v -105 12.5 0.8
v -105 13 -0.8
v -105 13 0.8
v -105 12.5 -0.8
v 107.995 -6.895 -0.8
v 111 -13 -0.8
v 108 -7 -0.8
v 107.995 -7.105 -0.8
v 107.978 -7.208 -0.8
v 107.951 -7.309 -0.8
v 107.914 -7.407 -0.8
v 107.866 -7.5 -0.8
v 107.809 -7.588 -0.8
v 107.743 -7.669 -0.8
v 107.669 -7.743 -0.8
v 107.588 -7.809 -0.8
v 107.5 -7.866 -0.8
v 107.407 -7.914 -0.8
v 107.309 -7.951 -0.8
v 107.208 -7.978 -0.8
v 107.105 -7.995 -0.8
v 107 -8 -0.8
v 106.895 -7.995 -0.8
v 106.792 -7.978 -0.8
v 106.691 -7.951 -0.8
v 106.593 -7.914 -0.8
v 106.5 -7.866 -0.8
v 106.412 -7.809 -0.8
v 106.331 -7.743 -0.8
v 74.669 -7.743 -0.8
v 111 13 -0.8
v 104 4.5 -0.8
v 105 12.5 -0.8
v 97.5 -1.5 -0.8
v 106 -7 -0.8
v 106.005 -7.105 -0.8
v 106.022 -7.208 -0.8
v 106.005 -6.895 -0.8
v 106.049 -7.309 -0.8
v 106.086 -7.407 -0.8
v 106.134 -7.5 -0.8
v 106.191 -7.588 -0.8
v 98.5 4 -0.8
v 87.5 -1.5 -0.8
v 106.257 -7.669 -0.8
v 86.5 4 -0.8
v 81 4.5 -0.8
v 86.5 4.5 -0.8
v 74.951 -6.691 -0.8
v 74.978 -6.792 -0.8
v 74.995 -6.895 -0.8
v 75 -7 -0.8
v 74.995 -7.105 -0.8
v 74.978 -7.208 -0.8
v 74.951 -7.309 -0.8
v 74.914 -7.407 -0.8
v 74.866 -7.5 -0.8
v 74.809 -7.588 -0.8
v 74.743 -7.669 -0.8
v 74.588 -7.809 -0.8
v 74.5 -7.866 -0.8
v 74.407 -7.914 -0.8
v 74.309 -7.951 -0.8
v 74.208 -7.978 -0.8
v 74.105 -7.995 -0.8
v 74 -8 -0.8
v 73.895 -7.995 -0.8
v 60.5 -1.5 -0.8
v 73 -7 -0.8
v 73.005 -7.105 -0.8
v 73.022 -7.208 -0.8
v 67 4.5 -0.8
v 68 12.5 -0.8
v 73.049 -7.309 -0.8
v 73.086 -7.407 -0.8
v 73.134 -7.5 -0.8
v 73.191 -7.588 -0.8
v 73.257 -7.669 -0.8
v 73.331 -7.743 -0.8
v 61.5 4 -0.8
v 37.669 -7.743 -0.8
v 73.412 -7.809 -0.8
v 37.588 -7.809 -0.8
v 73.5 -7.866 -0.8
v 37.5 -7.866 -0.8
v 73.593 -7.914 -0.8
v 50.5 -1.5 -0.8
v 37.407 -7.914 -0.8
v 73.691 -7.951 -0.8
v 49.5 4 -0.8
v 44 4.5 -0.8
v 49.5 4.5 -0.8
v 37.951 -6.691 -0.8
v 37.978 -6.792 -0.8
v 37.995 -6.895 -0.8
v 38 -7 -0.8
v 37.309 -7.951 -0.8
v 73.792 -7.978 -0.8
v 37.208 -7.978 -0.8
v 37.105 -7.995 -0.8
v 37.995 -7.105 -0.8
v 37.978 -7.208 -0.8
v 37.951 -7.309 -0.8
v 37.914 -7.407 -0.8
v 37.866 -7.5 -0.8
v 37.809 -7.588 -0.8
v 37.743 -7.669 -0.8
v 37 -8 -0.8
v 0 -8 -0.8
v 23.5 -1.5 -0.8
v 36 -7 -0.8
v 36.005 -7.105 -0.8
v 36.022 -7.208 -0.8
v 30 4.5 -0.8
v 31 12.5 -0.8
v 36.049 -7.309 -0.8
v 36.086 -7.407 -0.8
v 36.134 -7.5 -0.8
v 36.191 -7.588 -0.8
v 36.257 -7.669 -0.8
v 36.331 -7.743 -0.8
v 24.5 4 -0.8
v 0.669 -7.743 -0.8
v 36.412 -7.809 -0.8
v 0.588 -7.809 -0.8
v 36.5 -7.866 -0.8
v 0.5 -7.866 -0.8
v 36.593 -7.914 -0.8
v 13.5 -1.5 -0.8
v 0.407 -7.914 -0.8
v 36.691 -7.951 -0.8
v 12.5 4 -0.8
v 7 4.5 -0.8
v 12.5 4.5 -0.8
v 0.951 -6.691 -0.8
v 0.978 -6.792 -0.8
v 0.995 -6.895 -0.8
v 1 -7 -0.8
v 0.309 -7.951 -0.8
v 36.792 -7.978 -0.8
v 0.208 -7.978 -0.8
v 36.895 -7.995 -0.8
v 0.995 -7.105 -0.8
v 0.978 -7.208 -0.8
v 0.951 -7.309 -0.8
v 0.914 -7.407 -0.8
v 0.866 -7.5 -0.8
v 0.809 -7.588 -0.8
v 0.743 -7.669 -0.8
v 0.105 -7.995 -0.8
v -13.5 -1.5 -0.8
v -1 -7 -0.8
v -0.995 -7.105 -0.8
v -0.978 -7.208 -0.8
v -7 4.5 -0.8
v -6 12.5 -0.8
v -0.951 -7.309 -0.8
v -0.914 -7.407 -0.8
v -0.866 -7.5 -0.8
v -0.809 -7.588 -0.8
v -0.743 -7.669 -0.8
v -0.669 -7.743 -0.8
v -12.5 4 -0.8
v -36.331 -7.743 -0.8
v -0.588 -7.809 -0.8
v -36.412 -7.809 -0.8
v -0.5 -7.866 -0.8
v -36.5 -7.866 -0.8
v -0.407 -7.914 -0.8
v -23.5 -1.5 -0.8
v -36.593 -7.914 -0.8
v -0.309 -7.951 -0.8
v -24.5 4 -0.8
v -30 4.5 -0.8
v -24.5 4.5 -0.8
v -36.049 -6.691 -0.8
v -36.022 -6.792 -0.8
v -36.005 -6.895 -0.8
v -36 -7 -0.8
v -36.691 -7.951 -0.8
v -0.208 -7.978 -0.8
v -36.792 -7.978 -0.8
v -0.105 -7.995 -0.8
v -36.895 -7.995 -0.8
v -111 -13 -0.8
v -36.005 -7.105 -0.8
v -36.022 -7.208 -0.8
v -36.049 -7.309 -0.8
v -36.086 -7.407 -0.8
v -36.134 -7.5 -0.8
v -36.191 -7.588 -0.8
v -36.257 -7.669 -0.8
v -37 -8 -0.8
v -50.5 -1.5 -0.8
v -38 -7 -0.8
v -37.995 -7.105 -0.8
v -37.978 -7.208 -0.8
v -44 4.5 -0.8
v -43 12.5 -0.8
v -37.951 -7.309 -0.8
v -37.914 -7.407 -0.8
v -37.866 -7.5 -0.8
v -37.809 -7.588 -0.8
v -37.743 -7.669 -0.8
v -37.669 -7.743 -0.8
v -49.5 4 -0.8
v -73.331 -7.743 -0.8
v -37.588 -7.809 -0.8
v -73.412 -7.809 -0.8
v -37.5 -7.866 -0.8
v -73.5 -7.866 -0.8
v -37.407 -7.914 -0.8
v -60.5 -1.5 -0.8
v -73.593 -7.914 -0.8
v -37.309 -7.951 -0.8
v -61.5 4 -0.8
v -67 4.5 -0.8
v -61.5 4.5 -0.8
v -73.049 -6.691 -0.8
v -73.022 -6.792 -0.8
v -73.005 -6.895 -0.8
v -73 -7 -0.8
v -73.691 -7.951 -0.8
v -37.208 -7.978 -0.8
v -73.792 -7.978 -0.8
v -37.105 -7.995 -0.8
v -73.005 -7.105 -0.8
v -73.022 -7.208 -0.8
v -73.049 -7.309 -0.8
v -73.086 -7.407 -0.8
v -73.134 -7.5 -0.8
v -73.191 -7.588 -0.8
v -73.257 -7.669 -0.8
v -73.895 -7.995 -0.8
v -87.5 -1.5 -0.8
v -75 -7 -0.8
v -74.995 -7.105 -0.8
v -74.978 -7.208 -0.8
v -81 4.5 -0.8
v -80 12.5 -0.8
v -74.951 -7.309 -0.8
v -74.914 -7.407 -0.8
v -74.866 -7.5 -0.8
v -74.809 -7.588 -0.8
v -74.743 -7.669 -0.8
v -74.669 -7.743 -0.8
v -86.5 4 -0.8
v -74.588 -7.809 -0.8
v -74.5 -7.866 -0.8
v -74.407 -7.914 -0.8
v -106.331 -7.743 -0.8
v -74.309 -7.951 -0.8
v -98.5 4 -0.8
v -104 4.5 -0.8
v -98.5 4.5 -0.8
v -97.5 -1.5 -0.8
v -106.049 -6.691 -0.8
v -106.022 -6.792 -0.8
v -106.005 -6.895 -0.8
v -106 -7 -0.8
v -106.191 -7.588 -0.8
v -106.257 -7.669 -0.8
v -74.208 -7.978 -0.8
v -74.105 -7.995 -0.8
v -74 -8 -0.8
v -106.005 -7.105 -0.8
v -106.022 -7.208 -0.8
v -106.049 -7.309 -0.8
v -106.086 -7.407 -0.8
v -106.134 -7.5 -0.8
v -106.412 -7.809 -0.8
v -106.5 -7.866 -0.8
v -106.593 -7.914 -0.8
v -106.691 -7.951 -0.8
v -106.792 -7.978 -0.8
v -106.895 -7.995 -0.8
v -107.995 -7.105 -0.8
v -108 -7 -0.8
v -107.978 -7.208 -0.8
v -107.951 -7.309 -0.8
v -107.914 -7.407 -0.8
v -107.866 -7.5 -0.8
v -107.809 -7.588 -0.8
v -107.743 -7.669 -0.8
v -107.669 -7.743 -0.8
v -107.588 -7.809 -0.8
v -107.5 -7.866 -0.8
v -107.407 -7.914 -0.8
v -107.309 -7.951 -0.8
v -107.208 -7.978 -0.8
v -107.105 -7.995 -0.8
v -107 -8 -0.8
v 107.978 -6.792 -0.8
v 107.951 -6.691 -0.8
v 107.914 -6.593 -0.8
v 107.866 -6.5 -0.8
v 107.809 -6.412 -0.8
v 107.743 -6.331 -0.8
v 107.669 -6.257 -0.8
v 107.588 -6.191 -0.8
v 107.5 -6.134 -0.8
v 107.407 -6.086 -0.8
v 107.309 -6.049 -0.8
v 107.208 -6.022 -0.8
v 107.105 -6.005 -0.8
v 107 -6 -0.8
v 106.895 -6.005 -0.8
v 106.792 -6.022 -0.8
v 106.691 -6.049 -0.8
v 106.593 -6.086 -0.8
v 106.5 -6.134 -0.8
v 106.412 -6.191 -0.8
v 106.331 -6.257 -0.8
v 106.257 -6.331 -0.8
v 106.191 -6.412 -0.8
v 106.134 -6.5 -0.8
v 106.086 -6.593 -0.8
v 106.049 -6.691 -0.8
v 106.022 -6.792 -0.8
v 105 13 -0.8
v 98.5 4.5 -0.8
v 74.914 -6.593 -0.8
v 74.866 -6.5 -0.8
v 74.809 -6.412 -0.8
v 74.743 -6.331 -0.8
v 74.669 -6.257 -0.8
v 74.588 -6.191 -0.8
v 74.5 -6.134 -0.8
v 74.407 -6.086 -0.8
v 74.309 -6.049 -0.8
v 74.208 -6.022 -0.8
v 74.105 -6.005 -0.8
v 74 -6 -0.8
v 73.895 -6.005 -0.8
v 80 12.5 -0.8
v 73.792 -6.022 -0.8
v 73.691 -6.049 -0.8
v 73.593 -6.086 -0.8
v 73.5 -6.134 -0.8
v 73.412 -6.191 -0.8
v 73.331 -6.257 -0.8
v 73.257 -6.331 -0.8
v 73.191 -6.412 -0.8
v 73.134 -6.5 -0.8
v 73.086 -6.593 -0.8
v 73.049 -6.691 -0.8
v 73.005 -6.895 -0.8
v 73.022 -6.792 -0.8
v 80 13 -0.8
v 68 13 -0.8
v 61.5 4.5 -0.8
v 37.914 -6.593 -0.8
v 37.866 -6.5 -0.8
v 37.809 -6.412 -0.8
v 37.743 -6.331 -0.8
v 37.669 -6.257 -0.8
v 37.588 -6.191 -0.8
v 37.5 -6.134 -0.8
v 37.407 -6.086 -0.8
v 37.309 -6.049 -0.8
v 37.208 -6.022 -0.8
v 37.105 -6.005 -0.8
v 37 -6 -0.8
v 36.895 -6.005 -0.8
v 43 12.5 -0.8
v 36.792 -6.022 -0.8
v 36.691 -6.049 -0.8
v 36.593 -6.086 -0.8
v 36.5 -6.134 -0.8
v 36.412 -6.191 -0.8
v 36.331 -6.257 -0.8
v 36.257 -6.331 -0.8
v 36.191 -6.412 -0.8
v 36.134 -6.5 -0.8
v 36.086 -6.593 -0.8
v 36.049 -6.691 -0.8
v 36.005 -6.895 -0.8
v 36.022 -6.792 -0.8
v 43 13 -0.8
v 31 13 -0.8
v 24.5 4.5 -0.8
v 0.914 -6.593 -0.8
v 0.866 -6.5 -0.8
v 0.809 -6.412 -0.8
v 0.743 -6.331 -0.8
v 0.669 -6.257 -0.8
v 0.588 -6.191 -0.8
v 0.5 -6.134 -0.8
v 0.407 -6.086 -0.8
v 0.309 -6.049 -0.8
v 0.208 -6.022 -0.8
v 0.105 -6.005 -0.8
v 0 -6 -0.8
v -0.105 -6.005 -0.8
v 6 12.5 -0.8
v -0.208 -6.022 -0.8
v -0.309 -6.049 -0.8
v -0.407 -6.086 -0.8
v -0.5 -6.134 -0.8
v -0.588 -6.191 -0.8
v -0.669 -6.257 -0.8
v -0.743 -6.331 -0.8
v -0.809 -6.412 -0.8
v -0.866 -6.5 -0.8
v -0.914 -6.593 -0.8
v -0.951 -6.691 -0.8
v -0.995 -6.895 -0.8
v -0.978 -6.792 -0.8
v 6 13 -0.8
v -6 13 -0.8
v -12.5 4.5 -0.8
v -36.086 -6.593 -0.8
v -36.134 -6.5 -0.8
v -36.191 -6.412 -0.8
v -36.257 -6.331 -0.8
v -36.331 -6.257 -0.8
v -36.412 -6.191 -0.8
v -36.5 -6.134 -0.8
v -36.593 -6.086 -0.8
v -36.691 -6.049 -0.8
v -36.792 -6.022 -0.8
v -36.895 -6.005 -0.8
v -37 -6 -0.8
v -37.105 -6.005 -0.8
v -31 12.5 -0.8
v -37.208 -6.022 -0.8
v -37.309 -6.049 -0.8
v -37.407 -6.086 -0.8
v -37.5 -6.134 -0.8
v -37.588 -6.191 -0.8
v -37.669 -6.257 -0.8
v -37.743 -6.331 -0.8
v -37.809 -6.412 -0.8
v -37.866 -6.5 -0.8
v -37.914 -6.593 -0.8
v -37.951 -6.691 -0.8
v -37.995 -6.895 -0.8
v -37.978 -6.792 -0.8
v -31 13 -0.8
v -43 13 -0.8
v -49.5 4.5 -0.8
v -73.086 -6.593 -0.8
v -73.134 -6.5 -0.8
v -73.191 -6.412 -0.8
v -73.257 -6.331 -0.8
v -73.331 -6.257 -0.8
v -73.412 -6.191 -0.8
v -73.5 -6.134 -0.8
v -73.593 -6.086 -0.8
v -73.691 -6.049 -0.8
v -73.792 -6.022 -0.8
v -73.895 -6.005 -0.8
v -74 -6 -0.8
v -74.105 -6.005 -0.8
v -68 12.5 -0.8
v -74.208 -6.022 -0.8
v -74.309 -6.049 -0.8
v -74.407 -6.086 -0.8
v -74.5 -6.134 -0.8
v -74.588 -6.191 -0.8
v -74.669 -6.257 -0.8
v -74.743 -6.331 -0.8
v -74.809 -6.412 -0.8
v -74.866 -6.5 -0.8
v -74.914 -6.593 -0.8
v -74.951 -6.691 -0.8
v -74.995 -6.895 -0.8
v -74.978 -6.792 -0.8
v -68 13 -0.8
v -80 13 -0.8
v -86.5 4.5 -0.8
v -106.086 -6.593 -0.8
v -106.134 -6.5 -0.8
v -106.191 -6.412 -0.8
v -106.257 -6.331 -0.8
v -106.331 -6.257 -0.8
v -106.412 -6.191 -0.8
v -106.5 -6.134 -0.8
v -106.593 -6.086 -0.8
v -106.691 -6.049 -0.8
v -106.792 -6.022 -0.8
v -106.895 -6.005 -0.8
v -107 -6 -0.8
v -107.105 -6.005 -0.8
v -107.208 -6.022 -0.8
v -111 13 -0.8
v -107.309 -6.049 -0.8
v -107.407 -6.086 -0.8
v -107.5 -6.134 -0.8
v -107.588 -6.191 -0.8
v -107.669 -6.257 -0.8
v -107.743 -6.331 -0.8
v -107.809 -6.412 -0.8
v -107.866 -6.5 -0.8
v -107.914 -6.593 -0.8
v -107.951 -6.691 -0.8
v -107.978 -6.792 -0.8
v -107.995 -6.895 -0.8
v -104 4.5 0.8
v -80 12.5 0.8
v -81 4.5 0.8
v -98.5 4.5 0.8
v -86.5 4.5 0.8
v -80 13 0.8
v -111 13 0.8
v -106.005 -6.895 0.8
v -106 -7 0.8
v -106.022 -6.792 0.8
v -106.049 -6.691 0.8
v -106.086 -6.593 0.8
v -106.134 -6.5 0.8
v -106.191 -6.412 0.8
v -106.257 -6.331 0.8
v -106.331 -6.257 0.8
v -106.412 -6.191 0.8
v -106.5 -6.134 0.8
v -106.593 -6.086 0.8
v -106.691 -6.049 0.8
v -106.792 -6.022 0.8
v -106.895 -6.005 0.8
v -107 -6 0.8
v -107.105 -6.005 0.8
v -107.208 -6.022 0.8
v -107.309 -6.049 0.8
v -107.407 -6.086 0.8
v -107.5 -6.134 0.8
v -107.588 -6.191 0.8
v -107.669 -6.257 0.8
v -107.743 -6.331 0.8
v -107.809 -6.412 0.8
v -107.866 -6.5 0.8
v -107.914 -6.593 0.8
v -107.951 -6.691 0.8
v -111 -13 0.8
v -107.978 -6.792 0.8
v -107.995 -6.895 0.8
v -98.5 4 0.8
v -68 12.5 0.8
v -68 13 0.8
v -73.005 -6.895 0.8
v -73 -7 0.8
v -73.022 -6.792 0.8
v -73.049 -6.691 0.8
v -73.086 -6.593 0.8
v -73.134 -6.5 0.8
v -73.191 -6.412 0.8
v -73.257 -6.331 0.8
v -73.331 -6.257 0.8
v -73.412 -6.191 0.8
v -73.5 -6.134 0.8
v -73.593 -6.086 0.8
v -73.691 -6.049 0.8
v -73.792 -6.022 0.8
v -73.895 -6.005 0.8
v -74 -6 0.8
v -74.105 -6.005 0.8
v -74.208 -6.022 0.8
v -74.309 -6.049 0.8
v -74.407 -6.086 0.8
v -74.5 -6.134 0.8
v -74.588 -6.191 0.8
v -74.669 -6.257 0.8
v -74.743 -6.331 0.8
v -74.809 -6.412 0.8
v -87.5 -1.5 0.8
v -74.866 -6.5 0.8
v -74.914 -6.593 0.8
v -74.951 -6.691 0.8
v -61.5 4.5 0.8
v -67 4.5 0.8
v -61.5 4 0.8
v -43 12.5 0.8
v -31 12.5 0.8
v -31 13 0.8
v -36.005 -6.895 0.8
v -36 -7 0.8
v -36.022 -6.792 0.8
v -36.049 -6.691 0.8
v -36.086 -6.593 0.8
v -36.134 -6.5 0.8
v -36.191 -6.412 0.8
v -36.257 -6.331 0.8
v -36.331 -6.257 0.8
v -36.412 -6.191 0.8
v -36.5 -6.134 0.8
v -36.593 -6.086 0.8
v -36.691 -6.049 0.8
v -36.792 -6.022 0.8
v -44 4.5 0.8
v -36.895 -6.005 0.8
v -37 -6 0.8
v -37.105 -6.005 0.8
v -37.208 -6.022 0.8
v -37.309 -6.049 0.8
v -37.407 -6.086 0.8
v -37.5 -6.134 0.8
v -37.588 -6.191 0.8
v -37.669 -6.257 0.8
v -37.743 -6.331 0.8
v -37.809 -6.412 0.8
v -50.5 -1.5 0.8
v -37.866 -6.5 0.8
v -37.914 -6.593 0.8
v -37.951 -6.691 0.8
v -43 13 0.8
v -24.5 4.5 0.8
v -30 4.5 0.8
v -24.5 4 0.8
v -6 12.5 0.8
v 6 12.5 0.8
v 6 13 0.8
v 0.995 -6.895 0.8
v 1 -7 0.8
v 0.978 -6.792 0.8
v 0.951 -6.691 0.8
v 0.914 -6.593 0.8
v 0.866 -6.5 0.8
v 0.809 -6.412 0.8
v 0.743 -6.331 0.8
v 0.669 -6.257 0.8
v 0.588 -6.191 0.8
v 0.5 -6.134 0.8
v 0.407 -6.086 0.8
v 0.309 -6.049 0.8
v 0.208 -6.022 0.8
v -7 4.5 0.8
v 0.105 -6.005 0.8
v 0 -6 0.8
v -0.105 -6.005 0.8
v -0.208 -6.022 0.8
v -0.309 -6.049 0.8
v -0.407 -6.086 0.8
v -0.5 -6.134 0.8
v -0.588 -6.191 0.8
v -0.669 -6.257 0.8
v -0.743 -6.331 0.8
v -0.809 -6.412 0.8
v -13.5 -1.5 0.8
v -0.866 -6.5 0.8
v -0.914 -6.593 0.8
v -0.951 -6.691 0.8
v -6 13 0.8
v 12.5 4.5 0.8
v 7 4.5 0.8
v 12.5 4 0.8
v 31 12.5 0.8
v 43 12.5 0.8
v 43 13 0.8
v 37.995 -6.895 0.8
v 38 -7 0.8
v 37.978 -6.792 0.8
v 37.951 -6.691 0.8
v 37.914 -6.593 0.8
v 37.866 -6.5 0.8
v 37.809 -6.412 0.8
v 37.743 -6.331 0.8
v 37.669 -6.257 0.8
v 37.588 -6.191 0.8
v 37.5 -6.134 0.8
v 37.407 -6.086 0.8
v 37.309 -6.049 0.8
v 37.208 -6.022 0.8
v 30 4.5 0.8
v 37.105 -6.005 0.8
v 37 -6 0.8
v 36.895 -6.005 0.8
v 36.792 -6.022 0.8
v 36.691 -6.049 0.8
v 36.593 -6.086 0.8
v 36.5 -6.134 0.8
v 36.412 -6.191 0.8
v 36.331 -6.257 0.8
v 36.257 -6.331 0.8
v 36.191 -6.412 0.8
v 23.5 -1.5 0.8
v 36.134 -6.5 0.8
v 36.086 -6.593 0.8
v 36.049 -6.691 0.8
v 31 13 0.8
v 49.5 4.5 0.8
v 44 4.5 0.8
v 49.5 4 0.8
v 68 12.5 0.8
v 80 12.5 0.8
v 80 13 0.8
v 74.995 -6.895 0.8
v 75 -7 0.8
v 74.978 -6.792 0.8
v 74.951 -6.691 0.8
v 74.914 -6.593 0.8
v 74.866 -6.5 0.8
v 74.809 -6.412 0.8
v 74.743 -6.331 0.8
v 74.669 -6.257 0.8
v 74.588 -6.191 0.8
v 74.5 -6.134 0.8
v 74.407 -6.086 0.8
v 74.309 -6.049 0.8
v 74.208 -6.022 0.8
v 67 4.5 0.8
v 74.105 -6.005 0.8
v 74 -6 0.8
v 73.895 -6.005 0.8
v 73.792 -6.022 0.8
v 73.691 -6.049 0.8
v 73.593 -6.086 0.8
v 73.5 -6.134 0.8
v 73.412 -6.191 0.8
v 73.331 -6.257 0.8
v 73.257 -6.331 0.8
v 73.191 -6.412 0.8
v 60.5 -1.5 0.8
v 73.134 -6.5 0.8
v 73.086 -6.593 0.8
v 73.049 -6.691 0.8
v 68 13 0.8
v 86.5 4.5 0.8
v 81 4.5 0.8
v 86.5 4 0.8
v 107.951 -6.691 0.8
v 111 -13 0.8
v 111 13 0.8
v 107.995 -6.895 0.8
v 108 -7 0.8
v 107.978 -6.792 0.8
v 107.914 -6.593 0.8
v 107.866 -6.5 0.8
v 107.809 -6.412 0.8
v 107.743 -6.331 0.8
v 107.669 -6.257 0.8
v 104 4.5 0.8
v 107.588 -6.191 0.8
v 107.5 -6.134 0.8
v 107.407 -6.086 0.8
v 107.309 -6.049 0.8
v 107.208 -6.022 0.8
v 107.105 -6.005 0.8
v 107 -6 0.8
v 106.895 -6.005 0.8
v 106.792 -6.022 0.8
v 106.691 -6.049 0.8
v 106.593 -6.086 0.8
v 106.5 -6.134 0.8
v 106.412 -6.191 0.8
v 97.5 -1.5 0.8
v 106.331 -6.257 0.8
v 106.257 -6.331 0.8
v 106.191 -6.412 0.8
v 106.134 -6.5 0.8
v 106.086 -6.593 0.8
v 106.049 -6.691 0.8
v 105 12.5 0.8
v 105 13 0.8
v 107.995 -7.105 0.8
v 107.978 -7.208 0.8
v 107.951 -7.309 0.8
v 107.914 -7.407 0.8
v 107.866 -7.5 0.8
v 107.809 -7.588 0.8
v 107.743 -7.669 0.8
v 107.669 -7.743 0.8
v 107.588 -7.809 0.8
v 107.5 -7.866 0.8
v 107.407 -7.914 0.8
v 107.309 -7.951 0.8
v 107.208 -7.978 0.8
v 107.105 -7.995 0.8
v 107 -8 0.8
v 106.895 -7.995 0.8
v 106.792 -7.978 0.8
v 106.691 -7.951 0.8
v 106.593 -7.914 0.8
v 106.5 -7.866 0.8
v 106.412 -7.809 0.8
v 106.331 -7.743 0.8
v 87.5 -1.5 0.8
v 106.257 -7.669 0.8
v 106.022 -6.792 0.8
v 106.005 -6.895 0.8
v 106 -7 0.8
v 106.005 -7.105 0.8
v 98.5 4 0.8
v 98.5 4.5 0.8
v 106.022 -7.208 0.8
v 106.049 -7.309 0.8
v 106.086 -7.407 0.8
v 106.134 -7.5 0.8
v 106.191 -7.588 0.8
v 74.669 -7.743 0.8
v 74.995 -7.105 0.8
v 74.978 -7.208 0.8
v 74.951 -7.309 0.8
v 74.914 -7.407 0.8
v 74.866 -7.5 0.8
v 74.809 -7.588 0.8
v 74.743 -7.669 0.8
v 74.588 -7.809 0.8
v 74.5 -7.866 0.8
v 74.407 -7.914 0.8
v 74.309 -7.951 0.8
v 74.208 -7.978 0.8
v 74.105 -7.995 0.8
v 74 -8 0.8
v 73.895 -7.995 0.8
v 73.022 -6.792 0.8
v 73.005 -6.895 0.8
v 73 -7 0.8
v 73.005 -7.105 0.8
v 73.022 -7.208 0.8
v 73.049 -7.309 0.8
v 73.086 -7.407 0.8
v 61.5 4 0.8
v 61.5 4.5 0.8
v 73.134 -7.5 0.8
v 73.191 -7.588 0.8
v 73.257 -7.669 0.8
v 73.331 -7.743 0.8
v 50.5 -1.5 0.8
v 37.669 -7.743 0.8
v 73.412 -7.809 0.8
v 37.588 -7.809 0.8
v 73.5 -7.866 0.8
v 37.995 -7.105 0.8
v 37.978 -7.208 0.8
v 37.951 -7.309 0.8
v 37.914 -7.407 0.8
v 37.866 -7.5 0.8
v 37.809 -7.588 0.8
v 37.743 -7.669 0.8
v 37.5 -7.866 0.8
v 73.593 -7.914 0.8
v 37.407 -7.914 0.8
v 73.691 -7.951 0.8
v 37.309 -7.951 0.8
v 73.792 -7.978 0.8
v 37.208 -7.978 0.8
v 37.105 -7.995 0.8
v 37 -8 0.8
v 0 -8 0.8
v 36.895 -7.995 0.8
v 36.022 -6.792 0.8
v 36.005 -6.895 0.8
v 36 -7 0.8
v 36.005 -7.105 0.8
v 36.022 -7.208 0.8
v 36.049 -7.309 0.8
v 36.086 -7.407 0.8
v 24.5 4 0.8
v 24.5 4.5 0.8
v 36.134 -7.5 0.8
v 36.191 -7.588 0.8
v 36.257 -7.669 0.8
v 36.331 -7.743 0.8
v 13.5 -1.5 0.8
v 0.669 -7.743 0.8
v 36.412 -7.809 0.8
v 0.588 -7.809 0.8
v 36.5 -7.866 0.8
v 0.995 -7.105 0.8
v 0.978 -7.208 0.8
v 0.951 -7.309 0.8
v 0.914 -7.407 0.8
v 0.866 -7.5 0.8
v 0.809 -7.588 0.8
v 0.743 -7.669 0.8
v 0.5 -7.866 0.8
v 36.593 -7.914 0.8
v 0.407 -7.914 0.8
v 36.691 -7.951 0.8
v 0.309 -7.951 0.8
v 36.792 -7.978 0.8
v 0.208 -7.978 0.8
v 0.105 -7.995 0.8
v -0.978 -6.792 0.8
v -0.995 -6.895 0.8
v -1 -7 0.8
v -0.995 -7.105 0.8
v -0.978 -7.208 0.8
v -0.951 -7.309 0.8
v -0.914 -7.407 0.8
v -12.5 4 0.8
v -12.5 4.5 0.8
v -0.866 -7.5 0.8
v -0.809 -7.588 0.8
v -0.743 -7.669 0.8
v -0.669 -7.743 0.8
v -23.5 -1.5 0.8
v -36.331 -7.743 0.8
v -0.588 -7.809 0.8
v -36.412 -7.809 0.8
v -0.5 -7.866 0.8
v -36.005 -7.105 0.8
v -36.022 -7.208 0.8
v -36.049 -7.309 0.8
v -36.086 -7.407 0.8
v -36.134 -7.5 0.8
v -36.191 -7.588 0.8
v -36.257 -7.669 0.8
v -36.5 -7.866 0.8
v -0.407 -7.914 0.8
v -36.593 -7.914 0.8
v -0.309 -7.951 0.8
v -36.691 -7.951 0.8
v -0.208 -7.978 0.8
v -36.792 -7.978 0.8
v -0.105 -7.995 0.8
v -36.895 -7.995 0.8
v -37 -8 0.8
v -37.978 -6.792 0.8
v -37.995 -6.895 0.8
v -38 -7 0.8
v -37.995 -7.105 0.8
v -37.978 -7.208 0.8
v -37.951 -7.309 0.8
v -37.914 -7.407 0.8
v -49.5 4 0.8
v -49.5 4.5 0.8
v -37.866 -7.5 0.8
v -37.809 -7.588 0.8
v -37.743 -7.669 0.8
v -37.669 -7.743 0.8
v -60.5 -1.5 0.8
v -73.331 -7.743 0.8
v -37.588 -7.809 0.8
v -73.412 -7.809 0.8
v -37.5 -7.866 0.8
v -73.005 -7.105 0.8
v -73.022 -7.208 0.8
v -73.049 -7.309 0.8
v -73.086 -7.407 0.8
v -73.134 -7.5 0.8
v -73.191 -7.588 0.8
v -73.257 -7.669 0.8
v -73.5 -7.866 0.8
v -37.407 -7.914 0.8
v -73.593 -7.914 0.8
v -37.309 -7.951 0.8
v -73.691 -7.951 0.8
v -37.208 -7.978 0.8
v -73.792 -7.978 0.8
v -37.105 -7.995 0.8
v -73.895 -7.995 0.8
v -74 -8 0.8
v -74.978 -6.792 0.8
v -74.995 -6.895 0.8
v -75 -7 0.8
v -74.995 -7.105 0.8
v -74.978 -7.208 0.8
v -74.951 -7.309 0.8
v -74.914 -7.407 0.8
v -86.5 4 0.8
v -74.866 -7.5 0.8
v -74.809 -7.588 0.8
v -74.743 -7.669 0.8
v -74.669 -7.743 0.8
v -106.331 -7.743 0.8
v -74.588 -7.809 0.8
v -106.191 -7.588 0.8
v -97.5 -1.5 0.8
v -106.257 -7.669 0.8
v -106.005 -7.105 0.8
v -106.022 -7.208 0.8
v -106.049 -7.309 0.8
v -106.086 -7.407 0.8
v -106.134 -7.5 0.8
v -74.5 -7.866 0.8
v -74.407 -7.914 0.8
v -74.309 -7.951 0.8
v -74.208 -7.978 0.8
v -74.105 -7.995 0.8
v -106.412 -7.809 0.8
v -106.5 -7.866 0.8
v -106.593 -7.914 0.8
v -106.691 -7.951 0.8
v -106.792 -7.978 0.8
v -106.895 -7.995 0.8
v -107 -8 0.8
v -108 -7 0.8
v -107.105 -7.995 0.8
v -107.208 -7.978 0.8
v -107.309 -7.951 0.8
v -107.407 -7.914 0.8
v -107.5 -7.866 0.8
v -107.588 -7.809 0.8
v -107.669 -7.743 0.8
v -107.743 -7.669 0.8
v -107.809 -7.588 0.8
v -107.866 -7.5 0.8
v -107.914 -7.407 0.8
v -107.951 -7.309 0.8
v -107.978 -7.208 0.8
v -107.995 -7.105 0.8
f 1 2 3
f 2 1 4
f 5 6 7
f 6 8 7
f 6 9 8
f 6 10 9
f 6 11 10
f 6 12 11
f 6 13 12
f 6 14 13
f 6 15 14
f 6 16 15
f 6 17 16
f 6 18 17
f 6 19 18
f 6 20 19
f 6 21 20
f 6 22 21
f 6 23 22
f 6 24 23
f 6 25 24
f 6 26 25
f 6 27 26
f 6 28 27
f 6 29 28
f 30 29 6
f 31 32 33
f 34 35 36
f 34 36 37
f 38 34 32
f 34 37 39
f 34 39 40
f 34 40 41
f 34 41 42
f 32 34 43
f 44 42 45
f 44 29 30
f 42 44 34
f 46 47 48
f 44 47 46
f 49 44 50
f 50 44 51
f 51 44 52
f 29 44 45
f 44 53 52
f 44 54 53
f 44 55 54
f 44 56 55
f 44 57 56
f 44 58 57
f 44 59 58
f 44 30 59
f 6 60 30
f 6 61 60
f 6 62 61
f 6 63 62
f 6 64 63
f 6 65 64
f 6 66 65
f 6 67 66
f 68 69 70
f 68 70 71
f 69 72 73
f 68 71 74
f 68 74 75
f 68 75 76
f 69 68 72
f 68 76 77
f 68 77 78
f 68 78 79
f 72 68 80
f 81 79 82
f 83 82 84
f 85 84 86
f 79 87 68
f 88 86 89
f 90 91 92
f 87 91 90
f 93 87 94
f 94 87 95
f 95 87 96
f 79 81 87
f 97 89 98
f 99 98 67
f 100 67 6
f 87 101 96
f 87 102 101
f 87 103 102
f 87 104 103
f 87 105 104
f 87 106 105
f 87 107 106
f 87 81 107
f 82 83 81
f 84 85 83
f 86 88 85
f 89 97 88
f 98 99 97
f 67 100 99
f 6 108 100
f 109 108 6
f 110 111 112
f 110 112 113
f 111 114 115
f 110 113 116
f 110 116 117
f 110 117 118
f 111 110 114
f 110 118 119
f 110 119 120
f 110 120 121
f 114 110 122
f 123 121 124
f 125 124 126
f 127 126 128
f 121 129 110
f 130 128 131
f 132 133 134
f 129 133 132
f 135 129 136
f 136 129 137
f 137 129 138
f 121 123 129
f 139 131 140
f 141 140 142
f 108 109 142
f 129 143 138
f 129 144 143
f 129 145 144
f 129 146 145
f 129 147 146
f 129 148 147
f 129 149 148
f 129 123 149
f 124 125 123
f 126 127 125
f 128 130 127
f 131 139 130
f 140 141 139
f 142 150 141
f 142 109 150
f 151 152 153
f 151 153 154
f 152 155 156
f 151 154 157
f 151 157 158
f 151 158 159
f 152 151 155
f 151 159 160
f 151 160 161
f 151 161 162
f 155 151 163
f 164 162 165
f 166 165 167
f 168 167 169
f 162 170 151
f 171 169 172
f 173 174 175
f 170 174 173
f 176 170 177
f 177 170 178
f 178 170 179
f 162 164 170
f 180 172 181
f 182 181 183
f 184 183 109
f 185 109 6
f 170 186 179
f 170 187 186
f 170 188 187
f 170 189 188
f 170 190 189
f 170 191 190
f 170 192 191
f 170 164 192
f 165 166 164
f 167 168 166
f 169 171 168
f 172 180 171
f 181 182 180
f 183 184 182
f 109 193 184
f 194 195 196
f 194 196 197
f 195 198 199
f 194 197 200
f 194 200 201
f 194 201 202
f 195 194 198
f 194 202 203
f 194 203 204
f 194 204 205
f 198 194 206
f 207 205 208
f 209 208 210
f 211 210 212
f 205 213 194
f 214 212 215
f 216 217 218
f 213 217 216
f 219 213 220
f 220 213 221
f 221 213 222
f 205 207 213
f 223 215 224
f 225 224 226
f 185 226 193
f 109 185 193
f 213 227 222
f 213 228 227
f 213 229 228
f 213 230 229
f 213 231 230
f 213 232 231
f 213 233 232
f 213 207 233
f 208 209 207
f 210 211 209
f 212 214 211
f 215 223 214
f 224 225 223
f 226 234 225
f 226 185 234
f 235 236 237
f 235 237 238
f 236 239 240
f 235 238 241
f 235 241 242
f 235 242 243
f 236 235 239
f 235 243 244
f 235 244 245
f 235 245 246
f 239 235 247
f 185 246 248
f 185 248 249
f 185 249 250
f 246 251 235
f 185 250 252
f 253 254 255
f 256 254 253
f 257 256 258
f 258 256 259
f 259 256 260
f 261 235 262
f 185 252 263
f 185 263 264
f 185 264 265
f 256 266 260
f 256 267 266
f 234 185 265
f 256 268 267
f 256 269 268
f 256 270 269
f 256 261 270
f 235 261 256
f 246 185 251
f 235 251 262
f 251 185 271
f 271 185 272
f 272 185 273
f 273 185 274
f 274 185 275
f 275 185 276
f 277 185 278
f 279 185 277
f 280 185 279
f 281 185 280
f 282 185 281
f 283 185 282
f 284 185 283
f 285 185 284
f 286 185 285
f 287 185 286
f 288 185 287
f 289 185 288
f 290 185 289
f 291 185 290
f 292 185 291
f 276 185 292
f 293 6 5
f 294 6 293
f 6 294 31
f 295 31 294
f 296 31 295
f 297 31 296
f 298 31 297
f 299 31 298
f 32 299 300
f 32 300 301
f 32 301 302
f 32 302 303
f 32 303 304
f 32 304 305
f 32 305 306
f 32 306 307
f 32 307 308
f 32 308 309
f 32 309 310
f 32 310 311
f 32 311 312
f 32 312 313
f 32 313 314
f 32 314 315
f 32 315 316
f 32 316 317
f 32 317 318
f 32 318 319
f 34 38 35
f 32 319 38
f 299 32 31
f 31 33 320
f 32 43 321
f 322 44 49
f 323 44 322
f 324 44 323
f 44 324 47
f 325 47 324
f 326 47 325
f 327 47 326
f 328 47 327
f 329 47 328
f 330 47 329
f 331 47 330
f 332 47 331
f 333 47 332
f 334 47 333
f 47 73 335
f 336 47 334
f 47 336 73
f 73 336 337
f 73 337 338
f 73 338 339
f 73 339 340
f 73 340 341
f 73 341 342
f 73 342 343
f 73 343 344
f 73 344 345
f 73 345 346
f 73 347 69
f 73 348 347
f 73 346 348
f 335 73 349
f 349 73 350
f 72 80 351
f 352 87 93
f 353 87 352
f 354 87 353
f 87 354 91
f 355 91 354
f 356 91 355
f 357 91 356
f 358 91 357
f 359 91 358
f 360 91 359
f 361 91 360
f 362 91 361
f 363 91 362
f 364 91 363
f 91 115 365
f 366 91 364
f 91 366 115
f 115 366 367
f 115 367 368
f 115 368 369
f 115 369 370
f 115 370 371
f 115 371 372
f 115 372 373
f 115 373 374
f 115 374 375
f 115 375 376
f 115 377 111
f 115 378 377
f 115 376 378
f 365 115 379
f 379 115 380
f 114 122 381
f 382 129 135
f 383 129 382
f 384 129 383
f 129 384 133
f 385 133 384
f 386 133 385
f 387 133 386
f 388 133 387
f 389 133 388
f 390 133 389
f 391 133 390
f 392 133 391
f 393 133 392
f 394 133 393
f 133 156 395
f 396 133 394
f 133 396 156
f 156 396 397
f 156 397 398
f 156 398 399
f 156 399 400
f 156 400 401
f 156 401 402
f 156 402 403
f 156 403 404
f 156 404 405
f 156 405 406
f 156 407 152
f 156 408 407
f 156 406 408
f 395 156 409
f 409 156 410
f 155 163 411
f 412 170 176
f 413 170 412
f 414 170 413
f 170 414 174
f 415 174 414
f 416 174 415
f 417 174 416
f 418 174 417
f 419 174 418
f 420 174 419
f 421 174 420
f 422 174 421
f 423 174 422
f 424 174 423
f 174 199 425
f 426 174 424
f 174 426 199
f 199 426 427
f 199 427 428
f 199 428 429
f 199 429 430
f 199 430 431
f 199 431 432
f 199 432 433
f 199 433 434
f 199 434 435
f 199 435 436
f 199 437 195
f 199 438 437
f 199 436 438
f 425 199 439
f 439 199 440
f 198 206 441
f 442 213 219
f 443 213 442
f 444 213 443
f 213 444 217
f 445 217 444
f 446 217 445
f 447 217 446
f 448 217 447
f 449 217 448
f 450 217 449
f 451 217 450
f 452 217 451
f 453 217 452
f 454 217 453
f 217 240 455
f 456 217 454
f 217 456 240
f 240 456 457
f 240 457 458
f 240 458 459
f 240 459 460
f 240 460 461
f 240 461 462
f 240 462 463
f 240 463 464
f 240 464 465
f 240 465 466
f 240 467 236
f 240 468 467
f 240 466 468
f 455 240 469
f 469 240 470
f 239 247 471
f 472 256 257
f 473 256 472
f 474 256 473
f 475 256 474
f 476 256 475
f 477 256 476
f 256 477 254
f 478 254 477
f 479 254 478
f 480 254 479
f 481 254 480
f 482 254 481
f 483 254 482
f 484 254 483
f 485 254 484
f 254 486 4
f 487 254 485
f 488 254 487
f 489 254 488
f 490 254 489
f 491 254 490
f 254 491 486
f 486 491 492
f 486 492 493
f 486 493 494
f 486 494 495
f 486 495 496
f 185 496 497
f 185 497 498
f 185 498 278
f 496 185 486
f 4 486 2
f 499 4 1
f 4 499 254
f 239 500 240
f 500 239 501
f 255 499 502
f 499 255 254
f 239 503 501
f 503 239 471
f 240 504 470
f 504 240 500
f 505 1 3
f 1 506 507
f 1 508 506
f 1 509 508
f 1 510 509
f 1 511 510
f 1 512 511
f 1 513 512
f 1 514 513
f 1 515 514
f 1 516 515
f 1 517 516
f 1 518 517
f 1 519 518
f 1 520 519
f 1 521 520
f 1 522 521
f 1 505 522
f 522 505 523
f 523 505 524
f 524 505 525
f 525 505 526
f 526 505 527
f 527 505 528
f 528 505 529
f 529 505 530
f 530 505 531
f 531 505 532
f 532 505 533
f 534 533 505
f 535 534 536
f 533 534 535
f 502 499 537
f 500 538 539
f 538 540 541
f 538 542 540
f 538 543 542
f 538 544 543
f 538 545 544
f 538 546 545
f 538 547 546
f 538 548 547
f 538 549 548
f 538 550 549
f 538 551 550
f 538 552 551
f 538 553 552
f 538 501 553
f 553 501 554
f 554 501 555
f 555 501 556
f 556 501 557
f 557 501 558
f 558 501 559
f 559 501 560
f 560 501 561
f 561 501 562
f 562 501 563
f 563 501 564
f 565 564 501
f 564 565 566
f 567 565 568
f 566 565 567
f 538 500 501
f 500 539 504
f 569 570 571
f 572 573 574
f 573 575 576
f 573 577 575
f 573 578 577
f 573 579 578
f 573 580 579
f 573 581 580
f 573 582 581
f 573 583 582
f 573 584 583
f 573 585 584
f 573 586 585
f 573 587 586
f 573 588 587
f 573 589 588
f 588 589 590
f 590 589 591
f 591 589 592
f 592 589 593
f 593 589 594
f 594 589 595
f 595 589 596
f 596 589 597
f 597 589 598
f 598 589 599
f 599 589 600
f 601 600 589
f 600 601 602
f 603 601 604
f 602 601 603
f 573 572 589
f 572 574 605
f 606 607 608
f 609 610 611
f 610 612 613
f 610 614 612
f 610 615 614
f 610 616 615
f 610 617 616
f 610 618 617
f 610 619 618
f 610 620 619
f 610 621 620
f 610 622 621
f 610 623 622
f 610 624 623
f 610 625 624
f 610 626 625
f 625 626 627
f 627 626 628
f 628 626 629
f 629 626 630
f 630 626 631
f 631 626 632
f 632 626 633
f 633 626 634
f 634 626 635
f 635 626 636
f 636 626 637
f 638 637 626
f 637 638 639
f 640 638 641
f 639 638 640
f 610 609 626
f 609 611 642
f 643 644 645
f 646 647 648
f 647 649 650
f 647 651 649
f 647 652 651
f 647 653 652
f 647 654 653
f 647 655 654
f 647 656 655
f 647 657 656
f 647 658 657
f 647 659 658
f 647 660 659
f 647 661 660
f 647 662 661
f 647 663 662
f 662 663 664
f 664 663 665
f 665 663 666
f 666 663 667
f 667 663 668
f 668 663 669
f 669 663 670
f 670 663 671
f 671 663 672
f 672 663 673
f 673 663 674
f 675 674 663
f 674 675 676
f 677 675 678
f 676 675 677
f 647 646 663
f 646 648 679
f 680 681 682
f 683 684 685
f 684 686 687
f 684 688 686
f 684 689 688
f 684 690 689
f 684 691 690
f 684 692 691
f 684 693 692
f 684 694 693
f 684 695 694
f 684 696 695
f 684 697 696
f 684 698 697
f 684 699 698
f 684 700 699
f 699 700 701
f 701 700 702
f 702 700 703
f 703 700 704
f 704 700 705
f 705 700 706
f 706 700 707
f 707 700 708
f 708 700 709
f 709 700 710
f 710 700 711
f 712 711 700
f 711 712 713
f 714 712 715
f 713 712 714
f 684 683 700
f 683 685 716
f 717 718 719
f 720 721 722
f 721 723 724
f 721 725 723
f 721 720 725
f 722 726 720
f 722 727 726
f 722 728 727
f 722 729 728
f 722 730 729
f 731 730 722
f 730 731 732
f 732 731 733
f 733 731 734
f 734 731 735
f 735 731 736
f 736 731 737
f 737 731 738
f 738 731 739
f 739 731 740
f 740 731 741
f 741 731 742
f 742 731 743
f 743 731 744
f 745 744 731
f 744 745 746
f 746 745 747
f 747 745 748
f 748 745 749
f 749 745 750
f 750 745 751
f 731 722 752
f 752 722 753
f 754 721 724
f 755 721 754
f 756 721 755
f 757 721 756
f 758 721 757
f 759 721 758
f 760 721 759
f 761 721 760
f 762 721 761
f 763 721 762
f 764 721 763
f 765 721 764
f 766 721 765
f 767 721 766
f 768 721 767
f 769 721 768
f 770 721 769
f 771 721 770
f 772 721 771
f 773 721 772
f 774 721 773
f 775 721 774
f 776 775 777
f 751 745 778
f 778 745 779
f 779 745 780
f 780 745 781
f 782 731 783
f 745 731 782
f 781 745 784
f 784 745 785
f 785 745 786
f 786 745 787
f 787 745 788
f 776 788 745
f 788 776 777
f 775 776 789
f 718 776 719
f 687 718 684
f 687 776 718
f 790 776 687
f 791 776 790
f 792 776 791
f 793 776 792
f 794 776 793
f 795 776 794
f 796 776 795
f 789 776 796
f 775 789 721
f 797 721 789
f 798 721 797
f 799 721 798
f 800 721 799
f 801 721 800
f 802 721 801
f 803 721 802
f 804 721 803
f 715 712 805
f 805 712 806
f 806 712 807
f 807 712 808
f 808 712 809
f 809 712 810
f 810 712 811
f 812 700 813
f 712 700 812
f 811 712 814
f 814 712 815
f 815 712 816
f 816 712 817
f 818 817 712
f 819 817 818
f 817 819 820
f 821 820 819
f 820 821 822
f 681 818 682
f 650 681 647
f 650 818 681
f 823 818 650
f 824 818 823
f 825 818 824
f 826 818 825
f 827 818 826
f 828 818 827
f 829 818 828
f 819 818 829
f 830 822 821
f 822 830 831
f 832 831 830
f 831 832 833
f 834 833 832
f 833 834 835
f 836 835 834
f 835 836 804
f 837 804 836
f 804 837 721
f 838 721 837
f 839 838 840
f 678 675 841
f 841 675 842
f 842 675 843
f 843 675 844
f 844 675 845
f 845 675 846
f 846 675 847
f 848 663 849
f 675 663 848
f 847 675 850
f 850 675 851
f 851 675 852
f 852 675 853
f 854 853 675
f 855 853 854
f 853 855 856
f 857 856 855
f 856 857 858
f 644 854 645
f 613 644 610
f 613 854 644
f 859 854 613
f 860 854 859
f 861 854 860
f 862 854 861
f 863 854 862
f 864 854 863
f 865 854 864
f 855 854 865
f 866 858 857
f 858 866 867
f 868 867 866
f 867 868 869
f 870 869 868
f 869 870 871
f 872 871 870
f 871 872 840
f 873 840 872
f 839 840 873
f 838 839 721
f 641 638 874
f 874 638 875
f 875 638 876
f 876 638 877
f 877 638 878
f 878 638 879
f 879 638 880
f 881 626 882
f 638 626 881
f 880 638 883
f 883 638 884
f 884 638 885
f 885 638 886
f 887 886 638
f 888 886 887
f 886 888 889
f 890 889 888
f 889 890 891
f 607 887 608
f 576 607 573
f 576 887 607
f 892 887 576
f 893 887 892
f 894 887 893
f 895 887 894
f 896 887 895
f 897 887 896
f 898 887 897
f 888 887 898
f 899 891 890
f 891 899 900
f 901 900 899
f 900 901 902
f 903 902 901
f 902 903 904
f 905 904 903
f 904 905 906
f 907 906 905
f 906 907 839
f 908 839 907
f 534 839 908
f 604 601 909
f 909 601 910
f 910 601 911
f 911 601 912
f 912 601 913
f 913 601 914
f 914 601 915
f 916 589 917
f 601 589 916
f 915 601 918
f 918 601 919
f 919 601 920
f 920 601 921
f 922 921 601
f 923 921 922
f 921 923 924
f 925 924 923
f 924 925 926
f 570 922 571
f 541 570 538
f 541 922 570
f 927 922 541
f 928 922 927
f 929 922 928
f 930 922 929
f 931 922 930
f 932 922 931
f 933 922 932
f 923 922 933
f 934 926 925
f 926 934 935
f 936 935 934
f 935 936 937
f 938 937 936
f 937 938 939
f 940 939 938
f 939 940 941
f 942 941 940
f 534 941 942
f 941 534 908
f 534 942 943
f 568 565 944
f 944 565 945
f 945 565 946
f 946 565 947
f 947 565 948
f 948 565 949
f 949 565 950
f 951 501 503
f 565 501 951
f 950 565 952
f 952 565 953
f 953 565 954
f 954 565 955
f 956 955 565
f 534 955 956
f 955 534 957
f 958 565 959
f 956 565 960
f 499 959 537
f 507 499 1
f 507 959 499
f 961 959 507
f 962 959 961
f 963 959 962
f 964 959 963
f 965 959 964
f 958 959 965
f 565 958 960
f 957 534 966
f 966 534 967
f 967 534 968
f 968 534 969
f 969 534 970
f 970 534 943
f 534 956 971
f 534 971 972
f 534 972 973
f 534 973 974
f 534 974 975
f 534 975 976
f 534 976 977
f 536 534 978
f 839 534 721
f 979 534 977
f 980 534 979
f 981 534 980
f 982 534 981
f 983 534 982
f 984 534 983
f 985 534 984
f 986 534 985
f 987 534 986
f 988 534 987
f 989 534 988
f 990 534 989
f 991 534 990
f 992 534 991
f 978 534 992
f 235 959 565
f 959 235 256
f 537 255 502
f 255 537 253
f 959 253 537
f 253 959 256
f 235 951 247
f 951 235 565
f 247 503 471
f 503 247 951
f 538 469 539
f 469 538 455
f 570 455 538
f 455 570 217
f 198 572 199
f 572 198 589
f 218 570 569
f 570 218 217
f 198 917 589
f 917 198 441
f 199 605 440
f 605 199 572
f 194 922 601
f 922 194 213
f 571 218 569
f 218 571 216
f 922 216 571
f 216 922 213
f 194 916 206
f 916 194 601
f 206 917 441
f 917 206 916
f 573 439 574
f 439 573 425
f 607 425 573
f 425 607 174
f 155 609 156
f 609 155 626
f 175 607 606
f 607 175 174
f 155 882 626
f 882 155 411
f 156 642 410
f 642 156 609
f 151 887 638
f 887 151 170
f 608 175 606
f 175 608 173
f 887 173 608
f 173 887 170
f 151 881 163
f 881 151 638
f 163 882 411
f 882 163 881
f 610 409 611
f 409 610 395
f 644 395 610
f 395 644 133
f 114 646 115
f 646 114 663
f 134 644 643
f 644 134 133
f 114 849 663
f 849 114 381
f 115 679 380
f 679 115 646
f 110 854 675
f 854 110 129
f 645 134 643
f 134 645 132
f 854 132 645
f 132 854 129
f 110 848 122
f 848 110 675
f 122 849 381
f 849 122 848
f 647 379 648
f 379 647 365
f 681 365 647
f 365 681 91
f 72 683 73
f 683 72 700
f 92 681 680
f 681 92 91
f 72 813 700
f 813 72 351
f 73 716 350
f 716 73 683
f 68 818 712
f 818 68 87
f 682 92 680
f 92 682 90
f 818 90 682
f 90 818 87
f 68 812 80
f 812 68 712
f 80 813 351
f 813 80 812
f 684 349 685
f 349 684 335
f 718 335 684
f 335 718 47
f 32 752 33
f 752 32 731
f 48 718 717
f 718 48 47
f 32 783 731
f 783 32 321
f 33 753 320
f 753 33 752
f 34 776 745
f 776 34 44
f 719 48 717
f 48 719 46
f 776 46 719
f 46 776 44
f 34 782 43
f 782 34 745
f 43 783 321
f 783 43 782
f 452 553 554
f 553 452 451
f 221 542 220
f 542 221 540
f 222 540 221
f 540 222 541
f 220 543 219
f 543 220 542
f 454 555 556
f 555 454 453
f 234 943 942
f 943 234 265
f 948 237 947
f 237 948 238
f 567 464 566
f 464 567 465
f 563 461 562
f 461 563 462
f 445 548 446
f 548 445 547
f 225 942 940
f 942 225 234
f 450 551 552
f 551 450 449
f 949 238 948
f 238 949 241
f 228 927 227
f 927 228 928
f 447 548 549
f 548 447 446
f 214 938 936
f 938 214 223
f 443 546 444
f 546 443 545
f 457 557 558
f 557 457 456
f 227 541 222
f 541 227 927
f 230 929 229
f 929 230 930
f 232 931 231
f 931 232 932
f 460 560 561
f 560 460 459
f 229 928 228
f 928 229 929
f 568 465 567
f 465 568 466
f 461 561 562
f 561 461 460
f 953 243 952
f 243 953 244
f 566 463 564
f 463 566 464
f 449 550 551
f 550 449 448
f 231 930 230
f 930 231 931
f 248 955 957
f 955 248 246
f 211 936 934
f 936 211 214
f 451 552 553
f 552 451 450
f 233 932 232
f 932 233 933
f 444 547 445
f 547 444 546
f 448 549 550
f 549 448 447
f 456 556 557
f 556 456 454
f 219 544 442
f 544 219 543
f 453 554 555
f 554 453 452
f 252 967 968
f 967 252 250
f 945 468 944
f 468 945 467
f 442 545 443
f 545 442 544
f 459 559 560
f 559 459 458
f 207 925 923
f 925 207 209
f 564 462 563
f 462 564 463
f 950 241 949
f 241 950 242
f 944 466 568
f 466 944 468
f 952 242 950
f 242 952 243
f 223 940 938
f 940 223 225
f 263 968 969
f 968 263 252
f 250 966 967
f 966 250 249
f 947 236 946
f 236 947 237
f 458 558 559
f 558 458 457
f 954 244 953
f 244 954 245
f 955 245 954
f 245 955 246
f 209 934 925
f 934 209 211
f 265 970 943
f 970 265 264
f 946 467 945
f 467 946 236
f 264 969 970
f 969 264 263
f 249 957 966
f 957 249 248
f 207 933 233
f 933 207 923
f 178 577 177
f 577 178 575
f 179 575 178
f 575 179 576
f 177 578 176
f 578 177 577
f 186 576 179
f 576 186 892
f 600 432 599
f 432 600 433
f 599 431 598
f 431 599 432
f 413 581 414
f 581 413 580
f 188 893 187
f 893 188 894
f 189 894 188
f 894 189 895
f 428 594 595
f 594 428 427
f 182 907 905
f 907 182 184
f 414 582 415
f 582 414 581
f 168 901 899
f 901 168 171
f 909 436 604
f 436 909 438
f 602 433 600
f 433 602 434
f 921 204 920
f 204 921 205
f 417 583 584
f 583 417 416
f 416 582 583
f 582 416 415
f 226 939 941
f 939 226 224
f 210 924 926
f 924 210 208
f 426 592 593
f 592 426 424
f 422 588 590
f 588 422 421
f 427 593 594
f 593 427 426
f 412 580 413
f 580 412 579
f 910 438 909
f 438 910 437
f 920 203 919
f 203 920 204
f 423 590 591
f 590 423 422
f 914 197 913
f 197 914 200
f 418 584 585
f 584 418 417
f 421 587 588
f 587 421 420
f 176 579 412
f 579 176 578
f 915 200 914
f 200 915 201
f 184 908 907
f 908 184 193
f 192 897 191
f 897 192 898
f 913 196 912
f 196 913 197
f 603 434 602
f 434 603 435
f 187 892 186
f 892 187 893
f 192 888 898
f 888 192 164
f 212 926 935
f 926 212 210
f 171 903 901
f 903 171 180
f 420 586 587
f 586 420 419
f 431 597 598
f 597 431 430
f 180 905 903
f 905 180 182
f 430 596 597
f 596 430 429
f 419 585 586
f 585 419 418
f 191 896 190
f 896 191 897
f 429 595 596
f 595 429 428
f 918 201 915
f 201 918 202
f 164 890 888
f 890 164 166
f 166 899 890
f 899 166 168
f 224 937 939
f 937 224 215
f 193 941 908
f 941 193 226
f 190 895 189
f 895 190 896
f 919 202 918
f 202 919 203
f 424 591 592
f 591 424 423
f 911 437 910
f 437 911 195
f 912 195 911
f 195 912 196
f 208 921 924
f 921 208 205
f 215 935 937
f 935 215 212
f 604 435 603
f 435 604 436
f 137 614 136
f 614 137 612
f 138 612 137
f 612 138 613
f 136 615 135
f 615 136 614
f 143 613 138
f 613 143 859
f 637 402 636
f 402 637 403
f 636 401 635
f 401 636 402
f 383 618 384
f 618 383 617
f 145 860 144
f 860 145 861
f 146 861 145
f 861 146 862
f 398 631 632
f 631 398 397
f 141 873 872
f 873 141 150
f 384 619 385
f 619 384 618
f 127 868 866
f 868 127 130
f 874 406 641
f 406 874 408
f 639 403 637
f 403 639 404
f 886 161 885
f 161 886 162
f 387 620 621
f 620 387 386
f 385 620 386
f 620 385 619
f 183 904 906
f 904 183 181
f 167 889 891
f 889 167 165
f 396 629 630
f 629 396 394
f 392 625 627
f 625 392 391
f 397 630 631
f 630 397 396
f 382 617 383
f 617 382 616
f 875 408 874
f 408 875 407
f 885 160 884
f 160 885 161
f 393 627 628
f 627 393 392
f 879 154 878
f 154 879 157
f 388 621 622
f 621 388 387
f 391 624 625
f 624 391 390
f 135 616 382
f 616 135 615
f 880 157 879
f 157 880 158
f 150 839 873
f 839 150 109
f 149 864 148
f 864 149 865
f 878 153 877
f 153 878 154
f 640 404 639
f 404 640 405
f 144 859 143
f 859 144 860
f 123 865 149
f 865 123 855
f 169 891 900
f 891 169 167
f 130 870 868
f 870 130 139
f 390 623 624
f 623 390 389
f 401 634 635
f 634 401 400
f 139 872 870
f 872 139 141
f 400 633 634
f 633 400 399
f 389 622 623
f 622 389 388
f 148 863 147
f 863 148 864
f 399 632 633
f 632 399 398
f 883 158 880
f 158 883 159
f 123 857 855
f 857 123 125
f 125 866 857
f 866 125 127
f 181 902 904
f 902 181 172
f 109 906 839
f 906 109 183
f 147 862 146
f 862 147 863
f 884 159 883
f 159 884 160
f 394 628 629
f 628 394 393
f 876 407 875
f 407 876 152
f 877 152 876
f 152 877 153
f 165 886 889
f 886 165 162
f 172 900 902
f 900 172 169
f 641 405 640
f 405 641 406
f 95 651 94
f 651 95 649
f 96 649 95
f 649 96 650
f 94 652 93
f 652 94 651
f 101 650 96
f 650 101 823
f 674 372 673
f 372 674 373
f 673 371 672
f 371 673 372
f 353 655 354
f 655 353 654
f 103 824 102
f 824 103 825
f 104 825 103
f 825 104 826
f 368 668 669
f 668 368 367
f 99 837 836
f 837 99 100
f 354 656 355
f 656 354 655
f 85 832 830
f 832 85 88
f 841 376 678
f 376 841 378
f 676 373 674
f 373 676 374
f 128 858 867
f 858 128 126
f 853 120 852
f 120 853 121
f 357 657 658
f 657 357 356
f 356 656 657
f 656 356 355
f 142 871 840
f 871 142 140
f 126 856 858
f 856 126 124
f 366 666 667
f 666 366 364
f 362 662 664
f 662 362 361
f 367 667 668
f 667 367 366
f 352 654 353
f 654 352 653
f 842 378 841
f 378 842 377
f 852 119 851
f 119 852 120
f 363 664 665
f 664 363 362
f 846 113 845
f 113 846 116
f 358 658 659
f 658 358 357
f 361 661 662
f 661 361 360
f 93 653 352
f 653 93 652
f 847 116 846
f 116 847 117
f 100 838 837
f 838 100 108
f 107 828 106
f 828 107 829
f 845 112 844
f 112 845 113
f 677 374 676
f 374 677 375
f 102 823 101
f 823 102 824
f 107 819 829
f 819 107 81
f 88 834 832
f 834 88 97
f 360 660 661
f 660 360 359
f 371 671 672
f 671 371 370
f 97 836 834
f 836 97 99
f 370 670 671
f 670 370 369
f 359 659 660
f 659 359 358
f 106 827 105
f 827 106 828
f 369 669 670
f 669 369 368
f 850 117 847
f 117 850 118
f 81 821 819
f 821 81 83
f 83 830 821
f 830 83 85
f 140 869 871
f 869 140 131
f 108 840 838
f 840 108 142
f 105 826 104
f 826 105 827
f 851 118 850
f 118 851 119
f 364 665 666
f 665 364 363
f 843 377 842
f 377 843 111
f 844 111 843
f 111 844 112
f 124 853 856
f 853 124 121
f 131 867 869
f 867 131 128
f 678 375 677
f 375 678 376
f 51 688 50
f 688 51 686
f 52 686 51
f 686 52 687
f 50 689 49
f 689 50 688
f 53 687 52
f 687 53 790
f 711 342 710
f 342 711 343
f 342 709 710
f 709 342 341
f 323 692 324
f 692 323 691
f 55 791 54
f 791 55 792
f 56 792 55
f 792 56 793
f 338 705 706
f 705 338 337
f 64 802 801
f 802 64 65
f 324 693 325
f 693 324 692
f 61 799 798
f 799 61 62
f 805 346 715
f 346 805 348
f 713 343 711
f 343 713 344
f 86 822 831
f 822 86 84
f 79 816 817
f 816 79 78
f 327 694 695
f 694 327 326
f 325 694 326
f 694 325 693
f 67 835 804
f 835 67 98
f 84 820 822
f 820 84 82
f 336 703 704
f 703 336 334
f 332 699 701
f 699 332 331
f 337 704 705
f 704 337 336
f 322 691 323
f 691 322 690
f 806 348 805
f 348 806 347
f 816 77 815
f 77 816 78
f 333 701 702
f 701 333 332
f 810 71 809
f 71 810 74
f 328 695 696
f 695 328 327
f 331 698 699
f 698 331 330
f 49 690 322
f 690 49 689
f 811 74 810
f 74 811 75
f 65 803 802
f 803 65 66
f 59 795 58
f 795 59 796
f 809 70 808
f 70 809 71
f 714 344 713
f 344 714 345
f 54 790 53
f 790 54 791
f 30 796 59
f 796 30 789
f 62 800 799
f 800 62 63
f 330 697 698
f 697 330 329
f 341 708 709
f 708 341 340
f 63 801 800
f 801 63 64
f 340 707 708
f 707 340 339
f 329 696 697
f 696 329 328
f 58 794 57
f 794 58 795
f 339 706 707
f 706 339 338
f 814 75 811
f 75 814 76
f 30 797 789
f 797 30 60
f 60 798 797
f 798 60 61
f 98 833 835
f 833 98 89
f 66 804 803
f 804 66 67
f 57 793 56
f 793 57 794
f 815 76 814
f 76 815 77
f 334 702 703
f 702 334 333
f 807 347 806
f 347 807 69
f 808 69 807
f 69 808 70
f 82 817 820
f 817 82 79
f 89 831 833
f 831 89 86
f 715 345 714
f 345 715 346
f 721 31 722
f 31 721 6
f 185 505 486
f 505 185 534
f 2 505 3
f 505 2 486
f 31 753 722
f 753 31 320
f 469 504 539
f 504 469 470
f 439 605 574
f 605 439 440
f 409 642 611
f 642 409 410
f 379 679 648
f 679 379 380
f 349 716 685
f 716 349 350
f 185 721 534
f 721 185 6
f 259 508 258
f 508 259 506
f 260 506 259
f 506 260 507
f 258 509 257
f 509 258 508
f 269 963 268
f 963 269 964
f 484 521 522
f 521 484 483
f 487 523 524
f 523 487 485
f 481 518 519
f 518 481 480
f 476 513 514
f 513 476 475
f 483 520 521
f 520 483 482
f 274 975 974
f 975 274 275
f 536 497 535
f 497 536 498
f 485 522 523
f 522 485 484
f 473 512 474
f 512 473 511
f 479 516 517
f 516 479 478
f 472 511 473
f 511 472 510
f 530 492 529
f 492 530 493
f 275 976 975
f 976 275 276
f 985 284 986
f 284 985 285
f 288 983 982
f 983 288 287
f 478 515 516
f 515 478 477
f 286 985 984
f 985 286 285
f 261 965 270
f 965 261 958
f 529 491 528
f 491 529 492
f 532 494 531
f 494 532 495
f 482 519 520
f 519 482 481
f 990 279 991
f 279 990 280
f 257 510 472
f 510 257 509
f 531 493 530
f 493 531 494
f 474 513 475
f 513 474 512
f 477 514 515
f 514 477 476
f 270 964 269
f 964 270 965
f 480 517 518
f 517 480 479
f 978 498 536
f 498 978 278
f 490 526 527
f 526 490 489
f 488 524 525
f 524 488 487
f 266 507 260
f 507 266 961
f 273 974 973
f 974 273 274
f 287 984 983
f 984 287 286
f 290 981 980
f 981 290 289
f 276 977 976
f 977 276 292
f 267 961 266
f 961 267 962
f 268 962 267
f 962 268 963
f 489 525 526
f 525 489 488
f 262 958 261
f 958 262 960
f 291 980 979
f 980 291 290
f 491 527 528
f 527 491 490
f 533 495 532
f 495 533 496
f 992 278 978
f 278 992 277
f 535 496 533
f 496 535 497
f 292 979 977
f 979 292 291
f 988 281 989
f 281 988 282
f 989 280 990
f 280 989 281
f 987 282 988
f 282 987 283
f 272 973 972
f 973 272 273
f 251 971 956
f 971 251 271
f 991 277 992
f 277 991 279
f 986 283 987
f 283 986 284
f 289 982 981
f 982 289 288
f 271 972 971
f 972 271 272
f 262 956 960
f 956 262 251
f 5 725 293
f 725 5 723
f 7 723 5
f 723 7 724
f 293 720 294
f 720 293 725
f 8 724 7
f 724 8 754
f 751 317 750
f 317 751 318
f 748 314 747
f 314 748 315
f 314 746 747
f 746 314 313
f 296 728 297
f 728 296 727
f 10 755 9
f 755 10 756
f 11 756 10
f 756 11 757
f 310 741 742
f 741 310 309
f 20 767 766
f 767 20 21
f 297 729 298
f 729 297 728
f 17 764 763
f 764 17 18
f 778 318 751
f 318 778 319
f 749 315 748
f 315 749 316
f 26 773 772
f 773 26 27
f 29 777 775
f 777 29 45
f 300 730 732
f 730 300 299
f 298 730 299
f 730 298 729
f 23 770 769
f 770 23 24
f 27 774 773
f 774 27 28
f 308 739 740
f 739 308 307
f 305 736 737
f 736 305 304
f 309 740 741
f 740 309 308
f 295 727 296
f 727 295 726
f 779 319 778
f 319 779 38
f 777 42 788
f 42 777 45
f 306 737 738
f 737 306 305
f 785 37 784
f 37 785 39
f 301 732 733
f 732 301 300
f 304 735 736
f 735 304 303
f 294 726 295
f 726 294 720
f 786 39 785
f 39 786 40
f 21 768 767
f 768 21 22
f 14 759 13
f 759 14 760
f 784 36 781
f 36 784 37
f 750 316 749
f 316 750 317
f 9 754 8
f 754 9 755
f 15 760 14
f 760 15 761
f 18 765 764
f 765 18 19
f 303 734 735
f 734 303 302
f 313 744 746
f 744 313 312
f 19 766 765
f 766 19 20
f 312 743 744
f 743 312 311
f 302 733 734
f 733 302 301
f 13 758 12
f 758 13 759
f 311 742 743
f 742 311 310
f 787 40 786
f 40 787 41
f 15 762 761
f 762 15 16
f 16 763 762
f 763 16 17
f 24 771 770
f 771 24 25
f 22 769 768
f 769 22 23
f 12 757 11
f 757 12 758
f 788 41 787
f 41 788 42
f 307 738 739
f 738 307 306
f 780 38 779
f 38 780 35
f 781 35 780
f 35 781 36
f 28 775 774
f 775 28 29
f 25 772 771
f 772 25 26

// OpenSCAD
/* [Main Dimensions] */

// Hart-to-hart Distance between frames (35 - 38 are most used variations)
distance = 37;
// Frame size width (better set slightly larger than the actual width)
framesize = 23;
// Number of Frames
frames = 6;
// Thickness of spacer
Thickness = 1.6;
// Size of mount holes
holesize = 2;

/* [Hidden] */
leng = (frames)*distance;
wid = 26;
offset = 7;

echo("length=",leng);

module hole()
{
    hull()
    {
        translate([0,4,0])
            cube([framesize+2,1,Thickness],center=true);
        translate([0,-4,0])
            cube([framesize,1,Thickness],center=true);
    }
    translate([0,-4.5-3,0])
        cube([10,6,Thickness],center=true);
    hull()
    {
        translate([0,-4.5,0])
            cube([12,1,Thickness],center=true);
        translate([0,-4.5-5.5,0])
            cube([10,1,Thickness],center=true);
    }
}

difference()
{
    cube([leng,wid,Thickness],center=true);
    translate([-leng/2+distance/2,0,0])
    for(i=[0:frames-1])
    {
        translate([distance*i,wid/2-4,0])
            hole();
    }
    translate([-leng/2+distance,-offset,0])
    for(i=[0:frames-2])
    {
        translate([distance*i,0,0])
            cylinder(r=holesize/2,h=Thickness,$fn=60,center=true);
    }
    translate([-leng/2+holesize*2,-offset,0])
        cylinder(r=holesize/2,h=Thickness,$fn=60,center=true);
    translate([leng/2-holesize*2,-offset,0])
        cylinder(r=holesize/2,h=Thickness,$fn=60,center=true);
}
